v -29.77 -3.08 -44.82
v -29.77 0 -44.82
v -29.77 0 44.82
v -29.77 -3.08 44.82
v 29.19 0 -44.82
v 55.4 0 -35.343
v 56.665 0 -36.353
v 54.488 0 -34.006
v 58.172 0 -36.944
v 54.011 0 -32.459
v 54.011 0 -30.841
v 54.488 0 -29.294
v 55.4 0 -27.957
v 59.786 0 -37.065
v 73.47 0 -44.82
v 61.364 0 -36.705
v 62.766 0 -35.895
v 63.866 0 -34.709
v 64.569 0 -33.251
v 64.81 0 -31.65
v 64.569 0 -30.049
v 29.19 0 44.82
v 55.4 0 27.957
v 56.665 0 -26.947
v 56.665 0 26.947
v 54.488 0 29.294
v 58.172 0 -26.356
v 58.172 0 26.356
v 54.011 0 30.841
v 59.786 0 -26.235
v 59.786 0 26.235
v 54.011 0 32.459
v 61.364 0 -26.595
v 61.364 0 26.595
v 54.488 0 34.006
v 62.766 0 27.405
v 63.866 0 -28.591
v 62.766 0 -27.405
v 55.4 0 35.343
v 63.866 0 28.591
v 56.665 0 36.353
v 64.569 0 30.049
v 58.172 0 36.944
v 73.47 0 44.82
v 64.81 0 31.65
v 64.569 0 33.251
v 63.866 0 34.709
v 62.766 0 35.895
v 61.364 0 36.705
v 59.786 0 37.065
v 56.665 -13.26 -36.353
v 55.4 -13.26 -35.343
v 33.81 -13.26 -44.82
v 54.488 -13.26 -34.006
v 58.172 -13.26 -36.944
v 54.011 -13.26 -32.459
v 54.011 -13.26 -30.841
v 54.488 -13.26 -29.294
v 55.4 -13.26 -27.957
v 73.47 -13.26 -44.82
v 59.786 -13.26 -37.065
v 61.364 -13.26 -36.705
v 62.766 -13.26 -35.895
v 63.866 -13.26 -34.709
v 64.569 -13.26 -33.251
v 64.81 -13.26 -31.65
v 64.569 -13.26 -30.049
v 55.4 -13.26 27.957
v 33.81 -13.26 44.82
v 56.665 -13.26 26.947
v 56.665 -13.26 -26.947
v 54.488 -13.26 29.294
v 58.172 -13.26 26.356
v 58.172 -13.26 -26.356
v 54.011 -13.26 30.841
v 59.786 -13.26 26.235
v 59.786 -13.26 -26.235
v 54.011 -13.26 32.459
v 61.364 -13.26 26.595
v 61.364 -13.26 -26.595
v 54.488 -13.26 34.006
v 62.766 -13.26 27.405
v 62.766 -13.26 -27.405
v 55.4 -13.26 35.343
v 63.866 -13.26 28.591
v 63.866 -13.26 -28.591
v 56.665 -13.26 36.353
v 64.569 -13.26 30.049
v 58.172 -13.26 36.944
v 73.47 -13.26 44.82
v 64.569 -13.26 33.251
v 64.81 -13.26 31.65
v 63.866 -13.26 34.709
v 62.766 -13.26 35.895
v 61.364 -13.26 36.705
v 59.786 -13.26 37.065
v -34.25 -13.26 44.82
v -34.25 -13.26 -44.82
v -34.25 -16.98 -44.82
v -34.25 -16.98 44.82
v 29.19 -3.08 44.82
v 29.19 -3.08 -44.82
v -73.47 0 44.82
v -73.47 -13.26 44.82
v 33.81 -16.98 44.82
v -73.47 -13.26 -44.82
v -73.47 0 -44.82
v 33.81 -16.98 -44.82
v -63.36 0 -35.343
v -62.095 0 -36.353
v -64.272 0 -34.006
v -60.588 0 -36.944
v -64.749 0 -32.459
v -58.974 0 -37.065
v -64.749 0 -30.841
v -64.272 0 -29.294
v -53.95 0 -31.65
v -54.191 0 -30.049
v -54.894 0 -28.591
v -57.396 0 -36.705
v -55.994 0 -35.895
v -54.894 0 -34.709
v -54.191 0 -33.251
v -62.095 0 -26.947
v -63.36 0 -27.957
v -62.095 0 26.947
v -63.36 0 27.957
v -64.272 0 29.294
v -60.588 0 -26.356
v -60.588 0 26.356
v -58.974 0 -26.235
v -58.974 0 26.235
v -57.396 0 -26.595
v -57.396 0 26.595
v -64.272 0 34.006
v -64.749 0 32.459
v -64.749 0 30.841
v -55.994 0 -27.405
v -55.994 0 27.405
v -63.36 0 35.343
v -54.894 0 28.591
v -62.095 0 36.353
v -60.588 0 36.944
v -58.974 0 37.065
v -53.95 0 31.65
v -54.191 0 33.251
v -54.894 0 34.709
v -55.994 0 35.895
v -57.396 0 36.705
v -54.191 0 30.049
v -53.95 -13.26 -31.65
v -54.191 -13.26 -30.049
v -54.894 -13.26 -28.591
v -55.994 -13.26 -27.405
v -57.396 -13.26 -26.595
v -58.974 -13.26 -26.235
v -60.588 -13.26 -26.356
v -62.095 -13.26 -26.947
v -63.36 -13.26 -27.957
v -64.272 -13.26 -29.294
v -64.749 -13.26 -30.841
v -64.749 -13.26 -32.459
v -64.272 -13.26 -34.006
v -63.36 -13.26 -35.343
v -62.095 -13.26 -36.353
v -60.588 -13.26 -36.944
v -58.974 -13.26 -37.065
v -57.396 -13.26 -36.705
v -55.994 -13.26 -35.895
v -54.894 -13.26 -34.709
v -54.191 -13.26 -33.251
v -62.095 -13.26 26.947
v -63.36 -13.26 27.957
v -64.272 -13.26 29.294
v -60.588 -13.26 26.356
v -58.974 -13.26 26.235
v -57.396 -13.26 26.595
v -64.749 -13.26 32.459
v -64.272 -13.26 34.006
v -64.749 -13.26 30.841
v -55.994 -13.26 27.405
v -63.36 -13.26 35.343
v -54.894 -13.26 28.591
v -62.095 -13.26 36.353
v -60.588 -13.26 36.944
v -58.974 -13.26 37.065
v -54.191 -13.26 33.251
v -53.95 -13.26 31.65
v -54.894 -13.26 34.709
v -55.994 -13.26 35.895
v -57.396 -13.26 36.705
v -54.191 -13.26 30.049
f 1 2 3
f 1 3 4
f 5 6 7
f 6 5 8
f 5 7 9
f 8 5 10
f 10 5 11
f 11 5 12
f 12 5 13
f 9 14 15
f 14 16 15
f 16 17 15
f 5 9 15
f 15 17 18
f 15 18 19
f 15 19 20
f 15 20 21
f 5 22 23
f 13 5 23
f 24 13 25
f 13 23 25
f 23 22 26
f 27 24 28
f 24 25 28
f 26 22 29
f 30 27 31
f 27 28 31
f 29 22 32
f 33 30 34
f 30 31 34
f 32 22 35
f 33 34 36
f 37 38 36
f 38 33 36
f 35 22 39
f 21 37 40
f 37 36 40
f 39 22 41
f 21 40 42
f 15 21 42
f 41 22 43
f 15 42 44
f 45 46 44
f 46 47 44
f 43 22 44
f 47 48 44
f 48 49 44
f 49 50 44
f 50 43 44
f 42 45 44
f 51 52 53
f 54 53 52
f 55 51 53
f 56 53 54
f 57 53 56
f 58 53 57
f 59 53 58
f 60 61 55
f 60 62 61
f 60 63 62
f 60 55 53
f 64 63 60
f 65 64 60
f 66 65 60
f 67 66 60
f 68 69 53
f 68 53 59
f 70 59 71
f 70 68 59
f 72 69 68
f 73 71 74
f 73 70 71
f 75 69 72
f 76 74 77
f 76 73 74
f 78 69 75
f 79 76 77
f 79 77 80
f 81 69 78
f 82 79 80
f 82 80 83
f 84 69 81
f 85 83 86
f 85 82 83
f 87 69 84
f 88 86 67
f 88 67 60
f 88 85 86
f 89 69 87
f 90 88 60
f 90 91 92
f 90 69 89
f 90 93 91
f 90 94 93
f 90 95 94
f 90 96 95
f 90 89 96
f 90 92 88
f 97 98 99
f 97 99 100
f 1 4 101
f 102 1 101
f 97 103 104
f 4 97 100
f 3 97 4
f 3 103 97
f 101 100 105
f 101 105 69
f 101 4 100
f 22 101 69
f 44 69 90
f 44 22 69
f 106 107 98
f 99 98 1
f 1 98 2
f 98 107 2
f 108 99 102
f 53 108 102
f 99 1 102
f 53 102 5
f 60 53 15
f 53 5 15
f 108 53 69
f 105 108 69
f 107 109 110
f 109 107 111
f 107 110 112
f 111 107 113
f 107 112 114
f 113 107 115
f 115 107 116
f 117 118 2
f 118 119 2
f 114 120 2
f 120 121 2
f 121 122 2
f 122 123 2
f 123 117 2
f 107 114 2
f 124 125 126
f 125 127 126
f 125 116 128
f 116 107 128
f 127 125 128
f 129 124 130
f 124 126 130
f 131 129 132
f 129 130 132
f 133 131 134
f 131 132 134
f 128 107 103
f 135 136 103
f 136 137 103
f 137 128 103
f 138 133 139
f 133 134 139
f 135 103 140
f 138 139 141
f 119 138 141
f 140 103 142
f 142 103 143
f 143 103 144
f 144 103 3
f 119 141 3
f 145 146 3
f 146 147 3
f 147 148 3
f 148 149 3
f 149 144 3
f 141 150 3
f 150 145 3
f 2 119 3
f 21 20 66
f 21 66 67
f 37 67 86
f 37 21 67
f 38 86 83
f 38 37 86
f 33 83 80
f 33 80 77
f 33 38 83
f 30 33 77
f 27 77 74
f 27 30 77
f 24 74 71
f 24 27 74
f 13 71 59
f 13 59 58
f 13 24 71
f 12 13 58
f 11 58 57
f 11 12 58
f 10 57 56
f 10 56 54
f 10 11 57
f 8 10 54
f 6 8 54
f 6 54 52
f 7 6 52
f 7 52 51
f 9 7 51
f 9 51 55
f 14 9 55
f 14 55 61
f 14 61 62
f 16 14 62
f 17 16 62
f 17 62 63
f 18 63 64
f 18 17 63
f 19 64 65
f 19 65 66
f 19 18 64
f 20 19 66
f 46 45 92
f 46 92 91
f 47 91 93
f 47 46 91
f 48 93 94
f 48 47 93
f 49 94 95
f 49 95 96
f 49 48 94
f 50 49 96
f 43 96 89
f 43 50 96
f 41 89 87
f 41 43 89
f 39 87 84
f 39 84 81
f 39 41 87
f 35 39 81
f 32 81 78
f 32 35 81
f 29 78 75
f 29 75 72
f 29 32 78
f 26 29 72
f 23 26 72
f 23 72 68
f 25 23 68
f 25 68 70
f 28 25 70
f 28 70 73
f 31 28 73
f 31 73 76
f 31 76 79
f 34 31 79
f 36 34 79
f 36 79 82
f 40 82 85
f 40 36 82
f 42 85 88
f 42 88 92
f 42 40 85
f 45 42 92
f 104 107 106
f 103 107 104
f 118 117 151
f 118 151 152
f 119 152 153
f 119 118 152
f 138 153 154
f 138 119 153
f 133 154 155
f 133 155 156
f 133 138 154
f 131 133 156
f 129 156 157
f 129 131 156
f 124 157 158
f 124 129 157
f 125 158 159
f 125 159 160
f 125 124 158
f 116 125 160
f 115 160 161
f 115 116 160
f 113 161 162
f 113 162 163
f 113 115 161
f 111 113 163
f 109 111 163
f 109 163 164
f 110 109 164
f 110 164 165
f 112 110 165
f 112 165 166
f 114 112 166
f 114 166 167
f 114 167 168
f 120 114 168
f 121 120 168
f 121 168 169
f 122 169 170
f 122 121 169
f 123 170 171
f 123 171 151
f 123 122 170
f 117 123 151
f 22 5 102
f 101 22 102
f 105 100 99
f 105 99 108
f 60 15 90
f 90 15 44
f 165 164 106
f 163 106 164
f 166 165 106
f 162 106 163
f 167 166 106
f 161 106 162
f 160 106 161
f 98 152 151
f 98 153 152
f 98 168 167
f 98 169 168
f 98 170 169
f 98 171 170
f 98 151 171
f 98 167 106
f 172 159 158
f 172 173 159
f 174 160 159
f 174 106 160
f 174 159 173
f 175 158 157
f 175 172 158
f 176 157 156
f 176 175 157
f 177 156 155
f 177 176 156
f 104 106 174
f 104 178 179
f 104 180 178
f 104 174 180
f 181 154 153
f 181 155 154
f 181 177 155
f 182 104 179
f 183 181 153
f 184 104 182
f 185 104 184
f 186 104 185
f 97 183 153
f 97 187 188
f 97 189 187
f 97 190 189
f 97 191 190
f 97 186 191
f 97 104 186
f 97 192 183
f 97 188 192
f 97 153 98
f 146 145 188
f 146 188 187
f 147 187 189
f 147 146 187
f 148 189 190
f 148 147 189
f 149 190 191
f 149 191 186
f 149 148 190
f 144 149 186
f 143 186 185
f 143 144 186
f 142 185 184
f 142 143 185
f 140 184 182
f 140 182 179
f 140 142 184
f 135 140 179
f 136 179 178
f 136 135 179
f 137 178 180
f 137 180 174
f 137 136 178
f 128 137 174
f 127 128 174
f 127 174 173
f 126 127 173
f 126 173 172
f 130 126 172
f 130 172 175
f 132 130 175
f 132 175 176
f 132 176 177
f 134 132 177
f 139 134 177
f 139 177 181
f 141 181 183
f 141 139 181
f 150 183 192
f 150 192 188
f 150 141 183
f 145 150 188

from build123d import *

# Parameters (mm, degrees)
F0_W     = 39.66
F0_H     = 89.64
F0_R     = 5.43
F0_W_2   = 39.22
F1_DEPTH = 13.26
F0_W_3   = 68.06
F2_DEPTH = 16.98
F5_W     = 58.96
F5_H     = 3.08
F6_DEPTH = 89.641


with BuildPart() as f1:
    # F0 (on Front) → F1 (new body)
    with BuildSketch(Plane.XZ):
        with Locations((53.64, 0)):
            Rectangle(F0_W, F0_H)
        with Locations((59.38, -31.65)):
            Circle(F0_R, mode=Mode.SUBTRACT)
        with Locations((59.38, 31.65)):
            Circle(F0_R, mode=Mode.SUBTRACT)
        with Locations((-53.86, 0)):
            Rectangle(F0_W_2, F0_H)
        with Locations((-59.38, -31.65)):
            Circle(F0_R, mode=Mode.SUBTRACT)
        with Locations((-59.38, 31.65)):
            Circle(F0_R, mode=Mode.SUBTRACT)
    extrude(amount=F1_DEPTH)


with BuildPart() as f2:
    # F0 (on Front) → F2 (new body)
    with BuildSketch(Plane.XZ):
        with Locations((-0.22, 0)):
            Rectangle(F0_W_3, F0_H)
    extrude(amount=F2_DEPTH)

    # F3: union F1
    add(f1.part)

    # F4: union 

    # F5 (on face) → F6 (cut, through all)
    with BuildSketch(Plane(origin=(0, 0, -44.82), x_dir=(1, 0, 0), z_dir=(0, 0, -1))):
        Polygon((73.47, -21.704547), (73.47, 0), (29.19, 0), (-29.77, 0), (-73.47, 0), (-73.47, -21.704547), align=None)
        with Locations((-0.29, 1.54)):
            Rectangle(F5_W, F5_H)
    extrude(amount=-F6_DEPTH, mode=Mode.SUBTRACT)


solid = f2.part
